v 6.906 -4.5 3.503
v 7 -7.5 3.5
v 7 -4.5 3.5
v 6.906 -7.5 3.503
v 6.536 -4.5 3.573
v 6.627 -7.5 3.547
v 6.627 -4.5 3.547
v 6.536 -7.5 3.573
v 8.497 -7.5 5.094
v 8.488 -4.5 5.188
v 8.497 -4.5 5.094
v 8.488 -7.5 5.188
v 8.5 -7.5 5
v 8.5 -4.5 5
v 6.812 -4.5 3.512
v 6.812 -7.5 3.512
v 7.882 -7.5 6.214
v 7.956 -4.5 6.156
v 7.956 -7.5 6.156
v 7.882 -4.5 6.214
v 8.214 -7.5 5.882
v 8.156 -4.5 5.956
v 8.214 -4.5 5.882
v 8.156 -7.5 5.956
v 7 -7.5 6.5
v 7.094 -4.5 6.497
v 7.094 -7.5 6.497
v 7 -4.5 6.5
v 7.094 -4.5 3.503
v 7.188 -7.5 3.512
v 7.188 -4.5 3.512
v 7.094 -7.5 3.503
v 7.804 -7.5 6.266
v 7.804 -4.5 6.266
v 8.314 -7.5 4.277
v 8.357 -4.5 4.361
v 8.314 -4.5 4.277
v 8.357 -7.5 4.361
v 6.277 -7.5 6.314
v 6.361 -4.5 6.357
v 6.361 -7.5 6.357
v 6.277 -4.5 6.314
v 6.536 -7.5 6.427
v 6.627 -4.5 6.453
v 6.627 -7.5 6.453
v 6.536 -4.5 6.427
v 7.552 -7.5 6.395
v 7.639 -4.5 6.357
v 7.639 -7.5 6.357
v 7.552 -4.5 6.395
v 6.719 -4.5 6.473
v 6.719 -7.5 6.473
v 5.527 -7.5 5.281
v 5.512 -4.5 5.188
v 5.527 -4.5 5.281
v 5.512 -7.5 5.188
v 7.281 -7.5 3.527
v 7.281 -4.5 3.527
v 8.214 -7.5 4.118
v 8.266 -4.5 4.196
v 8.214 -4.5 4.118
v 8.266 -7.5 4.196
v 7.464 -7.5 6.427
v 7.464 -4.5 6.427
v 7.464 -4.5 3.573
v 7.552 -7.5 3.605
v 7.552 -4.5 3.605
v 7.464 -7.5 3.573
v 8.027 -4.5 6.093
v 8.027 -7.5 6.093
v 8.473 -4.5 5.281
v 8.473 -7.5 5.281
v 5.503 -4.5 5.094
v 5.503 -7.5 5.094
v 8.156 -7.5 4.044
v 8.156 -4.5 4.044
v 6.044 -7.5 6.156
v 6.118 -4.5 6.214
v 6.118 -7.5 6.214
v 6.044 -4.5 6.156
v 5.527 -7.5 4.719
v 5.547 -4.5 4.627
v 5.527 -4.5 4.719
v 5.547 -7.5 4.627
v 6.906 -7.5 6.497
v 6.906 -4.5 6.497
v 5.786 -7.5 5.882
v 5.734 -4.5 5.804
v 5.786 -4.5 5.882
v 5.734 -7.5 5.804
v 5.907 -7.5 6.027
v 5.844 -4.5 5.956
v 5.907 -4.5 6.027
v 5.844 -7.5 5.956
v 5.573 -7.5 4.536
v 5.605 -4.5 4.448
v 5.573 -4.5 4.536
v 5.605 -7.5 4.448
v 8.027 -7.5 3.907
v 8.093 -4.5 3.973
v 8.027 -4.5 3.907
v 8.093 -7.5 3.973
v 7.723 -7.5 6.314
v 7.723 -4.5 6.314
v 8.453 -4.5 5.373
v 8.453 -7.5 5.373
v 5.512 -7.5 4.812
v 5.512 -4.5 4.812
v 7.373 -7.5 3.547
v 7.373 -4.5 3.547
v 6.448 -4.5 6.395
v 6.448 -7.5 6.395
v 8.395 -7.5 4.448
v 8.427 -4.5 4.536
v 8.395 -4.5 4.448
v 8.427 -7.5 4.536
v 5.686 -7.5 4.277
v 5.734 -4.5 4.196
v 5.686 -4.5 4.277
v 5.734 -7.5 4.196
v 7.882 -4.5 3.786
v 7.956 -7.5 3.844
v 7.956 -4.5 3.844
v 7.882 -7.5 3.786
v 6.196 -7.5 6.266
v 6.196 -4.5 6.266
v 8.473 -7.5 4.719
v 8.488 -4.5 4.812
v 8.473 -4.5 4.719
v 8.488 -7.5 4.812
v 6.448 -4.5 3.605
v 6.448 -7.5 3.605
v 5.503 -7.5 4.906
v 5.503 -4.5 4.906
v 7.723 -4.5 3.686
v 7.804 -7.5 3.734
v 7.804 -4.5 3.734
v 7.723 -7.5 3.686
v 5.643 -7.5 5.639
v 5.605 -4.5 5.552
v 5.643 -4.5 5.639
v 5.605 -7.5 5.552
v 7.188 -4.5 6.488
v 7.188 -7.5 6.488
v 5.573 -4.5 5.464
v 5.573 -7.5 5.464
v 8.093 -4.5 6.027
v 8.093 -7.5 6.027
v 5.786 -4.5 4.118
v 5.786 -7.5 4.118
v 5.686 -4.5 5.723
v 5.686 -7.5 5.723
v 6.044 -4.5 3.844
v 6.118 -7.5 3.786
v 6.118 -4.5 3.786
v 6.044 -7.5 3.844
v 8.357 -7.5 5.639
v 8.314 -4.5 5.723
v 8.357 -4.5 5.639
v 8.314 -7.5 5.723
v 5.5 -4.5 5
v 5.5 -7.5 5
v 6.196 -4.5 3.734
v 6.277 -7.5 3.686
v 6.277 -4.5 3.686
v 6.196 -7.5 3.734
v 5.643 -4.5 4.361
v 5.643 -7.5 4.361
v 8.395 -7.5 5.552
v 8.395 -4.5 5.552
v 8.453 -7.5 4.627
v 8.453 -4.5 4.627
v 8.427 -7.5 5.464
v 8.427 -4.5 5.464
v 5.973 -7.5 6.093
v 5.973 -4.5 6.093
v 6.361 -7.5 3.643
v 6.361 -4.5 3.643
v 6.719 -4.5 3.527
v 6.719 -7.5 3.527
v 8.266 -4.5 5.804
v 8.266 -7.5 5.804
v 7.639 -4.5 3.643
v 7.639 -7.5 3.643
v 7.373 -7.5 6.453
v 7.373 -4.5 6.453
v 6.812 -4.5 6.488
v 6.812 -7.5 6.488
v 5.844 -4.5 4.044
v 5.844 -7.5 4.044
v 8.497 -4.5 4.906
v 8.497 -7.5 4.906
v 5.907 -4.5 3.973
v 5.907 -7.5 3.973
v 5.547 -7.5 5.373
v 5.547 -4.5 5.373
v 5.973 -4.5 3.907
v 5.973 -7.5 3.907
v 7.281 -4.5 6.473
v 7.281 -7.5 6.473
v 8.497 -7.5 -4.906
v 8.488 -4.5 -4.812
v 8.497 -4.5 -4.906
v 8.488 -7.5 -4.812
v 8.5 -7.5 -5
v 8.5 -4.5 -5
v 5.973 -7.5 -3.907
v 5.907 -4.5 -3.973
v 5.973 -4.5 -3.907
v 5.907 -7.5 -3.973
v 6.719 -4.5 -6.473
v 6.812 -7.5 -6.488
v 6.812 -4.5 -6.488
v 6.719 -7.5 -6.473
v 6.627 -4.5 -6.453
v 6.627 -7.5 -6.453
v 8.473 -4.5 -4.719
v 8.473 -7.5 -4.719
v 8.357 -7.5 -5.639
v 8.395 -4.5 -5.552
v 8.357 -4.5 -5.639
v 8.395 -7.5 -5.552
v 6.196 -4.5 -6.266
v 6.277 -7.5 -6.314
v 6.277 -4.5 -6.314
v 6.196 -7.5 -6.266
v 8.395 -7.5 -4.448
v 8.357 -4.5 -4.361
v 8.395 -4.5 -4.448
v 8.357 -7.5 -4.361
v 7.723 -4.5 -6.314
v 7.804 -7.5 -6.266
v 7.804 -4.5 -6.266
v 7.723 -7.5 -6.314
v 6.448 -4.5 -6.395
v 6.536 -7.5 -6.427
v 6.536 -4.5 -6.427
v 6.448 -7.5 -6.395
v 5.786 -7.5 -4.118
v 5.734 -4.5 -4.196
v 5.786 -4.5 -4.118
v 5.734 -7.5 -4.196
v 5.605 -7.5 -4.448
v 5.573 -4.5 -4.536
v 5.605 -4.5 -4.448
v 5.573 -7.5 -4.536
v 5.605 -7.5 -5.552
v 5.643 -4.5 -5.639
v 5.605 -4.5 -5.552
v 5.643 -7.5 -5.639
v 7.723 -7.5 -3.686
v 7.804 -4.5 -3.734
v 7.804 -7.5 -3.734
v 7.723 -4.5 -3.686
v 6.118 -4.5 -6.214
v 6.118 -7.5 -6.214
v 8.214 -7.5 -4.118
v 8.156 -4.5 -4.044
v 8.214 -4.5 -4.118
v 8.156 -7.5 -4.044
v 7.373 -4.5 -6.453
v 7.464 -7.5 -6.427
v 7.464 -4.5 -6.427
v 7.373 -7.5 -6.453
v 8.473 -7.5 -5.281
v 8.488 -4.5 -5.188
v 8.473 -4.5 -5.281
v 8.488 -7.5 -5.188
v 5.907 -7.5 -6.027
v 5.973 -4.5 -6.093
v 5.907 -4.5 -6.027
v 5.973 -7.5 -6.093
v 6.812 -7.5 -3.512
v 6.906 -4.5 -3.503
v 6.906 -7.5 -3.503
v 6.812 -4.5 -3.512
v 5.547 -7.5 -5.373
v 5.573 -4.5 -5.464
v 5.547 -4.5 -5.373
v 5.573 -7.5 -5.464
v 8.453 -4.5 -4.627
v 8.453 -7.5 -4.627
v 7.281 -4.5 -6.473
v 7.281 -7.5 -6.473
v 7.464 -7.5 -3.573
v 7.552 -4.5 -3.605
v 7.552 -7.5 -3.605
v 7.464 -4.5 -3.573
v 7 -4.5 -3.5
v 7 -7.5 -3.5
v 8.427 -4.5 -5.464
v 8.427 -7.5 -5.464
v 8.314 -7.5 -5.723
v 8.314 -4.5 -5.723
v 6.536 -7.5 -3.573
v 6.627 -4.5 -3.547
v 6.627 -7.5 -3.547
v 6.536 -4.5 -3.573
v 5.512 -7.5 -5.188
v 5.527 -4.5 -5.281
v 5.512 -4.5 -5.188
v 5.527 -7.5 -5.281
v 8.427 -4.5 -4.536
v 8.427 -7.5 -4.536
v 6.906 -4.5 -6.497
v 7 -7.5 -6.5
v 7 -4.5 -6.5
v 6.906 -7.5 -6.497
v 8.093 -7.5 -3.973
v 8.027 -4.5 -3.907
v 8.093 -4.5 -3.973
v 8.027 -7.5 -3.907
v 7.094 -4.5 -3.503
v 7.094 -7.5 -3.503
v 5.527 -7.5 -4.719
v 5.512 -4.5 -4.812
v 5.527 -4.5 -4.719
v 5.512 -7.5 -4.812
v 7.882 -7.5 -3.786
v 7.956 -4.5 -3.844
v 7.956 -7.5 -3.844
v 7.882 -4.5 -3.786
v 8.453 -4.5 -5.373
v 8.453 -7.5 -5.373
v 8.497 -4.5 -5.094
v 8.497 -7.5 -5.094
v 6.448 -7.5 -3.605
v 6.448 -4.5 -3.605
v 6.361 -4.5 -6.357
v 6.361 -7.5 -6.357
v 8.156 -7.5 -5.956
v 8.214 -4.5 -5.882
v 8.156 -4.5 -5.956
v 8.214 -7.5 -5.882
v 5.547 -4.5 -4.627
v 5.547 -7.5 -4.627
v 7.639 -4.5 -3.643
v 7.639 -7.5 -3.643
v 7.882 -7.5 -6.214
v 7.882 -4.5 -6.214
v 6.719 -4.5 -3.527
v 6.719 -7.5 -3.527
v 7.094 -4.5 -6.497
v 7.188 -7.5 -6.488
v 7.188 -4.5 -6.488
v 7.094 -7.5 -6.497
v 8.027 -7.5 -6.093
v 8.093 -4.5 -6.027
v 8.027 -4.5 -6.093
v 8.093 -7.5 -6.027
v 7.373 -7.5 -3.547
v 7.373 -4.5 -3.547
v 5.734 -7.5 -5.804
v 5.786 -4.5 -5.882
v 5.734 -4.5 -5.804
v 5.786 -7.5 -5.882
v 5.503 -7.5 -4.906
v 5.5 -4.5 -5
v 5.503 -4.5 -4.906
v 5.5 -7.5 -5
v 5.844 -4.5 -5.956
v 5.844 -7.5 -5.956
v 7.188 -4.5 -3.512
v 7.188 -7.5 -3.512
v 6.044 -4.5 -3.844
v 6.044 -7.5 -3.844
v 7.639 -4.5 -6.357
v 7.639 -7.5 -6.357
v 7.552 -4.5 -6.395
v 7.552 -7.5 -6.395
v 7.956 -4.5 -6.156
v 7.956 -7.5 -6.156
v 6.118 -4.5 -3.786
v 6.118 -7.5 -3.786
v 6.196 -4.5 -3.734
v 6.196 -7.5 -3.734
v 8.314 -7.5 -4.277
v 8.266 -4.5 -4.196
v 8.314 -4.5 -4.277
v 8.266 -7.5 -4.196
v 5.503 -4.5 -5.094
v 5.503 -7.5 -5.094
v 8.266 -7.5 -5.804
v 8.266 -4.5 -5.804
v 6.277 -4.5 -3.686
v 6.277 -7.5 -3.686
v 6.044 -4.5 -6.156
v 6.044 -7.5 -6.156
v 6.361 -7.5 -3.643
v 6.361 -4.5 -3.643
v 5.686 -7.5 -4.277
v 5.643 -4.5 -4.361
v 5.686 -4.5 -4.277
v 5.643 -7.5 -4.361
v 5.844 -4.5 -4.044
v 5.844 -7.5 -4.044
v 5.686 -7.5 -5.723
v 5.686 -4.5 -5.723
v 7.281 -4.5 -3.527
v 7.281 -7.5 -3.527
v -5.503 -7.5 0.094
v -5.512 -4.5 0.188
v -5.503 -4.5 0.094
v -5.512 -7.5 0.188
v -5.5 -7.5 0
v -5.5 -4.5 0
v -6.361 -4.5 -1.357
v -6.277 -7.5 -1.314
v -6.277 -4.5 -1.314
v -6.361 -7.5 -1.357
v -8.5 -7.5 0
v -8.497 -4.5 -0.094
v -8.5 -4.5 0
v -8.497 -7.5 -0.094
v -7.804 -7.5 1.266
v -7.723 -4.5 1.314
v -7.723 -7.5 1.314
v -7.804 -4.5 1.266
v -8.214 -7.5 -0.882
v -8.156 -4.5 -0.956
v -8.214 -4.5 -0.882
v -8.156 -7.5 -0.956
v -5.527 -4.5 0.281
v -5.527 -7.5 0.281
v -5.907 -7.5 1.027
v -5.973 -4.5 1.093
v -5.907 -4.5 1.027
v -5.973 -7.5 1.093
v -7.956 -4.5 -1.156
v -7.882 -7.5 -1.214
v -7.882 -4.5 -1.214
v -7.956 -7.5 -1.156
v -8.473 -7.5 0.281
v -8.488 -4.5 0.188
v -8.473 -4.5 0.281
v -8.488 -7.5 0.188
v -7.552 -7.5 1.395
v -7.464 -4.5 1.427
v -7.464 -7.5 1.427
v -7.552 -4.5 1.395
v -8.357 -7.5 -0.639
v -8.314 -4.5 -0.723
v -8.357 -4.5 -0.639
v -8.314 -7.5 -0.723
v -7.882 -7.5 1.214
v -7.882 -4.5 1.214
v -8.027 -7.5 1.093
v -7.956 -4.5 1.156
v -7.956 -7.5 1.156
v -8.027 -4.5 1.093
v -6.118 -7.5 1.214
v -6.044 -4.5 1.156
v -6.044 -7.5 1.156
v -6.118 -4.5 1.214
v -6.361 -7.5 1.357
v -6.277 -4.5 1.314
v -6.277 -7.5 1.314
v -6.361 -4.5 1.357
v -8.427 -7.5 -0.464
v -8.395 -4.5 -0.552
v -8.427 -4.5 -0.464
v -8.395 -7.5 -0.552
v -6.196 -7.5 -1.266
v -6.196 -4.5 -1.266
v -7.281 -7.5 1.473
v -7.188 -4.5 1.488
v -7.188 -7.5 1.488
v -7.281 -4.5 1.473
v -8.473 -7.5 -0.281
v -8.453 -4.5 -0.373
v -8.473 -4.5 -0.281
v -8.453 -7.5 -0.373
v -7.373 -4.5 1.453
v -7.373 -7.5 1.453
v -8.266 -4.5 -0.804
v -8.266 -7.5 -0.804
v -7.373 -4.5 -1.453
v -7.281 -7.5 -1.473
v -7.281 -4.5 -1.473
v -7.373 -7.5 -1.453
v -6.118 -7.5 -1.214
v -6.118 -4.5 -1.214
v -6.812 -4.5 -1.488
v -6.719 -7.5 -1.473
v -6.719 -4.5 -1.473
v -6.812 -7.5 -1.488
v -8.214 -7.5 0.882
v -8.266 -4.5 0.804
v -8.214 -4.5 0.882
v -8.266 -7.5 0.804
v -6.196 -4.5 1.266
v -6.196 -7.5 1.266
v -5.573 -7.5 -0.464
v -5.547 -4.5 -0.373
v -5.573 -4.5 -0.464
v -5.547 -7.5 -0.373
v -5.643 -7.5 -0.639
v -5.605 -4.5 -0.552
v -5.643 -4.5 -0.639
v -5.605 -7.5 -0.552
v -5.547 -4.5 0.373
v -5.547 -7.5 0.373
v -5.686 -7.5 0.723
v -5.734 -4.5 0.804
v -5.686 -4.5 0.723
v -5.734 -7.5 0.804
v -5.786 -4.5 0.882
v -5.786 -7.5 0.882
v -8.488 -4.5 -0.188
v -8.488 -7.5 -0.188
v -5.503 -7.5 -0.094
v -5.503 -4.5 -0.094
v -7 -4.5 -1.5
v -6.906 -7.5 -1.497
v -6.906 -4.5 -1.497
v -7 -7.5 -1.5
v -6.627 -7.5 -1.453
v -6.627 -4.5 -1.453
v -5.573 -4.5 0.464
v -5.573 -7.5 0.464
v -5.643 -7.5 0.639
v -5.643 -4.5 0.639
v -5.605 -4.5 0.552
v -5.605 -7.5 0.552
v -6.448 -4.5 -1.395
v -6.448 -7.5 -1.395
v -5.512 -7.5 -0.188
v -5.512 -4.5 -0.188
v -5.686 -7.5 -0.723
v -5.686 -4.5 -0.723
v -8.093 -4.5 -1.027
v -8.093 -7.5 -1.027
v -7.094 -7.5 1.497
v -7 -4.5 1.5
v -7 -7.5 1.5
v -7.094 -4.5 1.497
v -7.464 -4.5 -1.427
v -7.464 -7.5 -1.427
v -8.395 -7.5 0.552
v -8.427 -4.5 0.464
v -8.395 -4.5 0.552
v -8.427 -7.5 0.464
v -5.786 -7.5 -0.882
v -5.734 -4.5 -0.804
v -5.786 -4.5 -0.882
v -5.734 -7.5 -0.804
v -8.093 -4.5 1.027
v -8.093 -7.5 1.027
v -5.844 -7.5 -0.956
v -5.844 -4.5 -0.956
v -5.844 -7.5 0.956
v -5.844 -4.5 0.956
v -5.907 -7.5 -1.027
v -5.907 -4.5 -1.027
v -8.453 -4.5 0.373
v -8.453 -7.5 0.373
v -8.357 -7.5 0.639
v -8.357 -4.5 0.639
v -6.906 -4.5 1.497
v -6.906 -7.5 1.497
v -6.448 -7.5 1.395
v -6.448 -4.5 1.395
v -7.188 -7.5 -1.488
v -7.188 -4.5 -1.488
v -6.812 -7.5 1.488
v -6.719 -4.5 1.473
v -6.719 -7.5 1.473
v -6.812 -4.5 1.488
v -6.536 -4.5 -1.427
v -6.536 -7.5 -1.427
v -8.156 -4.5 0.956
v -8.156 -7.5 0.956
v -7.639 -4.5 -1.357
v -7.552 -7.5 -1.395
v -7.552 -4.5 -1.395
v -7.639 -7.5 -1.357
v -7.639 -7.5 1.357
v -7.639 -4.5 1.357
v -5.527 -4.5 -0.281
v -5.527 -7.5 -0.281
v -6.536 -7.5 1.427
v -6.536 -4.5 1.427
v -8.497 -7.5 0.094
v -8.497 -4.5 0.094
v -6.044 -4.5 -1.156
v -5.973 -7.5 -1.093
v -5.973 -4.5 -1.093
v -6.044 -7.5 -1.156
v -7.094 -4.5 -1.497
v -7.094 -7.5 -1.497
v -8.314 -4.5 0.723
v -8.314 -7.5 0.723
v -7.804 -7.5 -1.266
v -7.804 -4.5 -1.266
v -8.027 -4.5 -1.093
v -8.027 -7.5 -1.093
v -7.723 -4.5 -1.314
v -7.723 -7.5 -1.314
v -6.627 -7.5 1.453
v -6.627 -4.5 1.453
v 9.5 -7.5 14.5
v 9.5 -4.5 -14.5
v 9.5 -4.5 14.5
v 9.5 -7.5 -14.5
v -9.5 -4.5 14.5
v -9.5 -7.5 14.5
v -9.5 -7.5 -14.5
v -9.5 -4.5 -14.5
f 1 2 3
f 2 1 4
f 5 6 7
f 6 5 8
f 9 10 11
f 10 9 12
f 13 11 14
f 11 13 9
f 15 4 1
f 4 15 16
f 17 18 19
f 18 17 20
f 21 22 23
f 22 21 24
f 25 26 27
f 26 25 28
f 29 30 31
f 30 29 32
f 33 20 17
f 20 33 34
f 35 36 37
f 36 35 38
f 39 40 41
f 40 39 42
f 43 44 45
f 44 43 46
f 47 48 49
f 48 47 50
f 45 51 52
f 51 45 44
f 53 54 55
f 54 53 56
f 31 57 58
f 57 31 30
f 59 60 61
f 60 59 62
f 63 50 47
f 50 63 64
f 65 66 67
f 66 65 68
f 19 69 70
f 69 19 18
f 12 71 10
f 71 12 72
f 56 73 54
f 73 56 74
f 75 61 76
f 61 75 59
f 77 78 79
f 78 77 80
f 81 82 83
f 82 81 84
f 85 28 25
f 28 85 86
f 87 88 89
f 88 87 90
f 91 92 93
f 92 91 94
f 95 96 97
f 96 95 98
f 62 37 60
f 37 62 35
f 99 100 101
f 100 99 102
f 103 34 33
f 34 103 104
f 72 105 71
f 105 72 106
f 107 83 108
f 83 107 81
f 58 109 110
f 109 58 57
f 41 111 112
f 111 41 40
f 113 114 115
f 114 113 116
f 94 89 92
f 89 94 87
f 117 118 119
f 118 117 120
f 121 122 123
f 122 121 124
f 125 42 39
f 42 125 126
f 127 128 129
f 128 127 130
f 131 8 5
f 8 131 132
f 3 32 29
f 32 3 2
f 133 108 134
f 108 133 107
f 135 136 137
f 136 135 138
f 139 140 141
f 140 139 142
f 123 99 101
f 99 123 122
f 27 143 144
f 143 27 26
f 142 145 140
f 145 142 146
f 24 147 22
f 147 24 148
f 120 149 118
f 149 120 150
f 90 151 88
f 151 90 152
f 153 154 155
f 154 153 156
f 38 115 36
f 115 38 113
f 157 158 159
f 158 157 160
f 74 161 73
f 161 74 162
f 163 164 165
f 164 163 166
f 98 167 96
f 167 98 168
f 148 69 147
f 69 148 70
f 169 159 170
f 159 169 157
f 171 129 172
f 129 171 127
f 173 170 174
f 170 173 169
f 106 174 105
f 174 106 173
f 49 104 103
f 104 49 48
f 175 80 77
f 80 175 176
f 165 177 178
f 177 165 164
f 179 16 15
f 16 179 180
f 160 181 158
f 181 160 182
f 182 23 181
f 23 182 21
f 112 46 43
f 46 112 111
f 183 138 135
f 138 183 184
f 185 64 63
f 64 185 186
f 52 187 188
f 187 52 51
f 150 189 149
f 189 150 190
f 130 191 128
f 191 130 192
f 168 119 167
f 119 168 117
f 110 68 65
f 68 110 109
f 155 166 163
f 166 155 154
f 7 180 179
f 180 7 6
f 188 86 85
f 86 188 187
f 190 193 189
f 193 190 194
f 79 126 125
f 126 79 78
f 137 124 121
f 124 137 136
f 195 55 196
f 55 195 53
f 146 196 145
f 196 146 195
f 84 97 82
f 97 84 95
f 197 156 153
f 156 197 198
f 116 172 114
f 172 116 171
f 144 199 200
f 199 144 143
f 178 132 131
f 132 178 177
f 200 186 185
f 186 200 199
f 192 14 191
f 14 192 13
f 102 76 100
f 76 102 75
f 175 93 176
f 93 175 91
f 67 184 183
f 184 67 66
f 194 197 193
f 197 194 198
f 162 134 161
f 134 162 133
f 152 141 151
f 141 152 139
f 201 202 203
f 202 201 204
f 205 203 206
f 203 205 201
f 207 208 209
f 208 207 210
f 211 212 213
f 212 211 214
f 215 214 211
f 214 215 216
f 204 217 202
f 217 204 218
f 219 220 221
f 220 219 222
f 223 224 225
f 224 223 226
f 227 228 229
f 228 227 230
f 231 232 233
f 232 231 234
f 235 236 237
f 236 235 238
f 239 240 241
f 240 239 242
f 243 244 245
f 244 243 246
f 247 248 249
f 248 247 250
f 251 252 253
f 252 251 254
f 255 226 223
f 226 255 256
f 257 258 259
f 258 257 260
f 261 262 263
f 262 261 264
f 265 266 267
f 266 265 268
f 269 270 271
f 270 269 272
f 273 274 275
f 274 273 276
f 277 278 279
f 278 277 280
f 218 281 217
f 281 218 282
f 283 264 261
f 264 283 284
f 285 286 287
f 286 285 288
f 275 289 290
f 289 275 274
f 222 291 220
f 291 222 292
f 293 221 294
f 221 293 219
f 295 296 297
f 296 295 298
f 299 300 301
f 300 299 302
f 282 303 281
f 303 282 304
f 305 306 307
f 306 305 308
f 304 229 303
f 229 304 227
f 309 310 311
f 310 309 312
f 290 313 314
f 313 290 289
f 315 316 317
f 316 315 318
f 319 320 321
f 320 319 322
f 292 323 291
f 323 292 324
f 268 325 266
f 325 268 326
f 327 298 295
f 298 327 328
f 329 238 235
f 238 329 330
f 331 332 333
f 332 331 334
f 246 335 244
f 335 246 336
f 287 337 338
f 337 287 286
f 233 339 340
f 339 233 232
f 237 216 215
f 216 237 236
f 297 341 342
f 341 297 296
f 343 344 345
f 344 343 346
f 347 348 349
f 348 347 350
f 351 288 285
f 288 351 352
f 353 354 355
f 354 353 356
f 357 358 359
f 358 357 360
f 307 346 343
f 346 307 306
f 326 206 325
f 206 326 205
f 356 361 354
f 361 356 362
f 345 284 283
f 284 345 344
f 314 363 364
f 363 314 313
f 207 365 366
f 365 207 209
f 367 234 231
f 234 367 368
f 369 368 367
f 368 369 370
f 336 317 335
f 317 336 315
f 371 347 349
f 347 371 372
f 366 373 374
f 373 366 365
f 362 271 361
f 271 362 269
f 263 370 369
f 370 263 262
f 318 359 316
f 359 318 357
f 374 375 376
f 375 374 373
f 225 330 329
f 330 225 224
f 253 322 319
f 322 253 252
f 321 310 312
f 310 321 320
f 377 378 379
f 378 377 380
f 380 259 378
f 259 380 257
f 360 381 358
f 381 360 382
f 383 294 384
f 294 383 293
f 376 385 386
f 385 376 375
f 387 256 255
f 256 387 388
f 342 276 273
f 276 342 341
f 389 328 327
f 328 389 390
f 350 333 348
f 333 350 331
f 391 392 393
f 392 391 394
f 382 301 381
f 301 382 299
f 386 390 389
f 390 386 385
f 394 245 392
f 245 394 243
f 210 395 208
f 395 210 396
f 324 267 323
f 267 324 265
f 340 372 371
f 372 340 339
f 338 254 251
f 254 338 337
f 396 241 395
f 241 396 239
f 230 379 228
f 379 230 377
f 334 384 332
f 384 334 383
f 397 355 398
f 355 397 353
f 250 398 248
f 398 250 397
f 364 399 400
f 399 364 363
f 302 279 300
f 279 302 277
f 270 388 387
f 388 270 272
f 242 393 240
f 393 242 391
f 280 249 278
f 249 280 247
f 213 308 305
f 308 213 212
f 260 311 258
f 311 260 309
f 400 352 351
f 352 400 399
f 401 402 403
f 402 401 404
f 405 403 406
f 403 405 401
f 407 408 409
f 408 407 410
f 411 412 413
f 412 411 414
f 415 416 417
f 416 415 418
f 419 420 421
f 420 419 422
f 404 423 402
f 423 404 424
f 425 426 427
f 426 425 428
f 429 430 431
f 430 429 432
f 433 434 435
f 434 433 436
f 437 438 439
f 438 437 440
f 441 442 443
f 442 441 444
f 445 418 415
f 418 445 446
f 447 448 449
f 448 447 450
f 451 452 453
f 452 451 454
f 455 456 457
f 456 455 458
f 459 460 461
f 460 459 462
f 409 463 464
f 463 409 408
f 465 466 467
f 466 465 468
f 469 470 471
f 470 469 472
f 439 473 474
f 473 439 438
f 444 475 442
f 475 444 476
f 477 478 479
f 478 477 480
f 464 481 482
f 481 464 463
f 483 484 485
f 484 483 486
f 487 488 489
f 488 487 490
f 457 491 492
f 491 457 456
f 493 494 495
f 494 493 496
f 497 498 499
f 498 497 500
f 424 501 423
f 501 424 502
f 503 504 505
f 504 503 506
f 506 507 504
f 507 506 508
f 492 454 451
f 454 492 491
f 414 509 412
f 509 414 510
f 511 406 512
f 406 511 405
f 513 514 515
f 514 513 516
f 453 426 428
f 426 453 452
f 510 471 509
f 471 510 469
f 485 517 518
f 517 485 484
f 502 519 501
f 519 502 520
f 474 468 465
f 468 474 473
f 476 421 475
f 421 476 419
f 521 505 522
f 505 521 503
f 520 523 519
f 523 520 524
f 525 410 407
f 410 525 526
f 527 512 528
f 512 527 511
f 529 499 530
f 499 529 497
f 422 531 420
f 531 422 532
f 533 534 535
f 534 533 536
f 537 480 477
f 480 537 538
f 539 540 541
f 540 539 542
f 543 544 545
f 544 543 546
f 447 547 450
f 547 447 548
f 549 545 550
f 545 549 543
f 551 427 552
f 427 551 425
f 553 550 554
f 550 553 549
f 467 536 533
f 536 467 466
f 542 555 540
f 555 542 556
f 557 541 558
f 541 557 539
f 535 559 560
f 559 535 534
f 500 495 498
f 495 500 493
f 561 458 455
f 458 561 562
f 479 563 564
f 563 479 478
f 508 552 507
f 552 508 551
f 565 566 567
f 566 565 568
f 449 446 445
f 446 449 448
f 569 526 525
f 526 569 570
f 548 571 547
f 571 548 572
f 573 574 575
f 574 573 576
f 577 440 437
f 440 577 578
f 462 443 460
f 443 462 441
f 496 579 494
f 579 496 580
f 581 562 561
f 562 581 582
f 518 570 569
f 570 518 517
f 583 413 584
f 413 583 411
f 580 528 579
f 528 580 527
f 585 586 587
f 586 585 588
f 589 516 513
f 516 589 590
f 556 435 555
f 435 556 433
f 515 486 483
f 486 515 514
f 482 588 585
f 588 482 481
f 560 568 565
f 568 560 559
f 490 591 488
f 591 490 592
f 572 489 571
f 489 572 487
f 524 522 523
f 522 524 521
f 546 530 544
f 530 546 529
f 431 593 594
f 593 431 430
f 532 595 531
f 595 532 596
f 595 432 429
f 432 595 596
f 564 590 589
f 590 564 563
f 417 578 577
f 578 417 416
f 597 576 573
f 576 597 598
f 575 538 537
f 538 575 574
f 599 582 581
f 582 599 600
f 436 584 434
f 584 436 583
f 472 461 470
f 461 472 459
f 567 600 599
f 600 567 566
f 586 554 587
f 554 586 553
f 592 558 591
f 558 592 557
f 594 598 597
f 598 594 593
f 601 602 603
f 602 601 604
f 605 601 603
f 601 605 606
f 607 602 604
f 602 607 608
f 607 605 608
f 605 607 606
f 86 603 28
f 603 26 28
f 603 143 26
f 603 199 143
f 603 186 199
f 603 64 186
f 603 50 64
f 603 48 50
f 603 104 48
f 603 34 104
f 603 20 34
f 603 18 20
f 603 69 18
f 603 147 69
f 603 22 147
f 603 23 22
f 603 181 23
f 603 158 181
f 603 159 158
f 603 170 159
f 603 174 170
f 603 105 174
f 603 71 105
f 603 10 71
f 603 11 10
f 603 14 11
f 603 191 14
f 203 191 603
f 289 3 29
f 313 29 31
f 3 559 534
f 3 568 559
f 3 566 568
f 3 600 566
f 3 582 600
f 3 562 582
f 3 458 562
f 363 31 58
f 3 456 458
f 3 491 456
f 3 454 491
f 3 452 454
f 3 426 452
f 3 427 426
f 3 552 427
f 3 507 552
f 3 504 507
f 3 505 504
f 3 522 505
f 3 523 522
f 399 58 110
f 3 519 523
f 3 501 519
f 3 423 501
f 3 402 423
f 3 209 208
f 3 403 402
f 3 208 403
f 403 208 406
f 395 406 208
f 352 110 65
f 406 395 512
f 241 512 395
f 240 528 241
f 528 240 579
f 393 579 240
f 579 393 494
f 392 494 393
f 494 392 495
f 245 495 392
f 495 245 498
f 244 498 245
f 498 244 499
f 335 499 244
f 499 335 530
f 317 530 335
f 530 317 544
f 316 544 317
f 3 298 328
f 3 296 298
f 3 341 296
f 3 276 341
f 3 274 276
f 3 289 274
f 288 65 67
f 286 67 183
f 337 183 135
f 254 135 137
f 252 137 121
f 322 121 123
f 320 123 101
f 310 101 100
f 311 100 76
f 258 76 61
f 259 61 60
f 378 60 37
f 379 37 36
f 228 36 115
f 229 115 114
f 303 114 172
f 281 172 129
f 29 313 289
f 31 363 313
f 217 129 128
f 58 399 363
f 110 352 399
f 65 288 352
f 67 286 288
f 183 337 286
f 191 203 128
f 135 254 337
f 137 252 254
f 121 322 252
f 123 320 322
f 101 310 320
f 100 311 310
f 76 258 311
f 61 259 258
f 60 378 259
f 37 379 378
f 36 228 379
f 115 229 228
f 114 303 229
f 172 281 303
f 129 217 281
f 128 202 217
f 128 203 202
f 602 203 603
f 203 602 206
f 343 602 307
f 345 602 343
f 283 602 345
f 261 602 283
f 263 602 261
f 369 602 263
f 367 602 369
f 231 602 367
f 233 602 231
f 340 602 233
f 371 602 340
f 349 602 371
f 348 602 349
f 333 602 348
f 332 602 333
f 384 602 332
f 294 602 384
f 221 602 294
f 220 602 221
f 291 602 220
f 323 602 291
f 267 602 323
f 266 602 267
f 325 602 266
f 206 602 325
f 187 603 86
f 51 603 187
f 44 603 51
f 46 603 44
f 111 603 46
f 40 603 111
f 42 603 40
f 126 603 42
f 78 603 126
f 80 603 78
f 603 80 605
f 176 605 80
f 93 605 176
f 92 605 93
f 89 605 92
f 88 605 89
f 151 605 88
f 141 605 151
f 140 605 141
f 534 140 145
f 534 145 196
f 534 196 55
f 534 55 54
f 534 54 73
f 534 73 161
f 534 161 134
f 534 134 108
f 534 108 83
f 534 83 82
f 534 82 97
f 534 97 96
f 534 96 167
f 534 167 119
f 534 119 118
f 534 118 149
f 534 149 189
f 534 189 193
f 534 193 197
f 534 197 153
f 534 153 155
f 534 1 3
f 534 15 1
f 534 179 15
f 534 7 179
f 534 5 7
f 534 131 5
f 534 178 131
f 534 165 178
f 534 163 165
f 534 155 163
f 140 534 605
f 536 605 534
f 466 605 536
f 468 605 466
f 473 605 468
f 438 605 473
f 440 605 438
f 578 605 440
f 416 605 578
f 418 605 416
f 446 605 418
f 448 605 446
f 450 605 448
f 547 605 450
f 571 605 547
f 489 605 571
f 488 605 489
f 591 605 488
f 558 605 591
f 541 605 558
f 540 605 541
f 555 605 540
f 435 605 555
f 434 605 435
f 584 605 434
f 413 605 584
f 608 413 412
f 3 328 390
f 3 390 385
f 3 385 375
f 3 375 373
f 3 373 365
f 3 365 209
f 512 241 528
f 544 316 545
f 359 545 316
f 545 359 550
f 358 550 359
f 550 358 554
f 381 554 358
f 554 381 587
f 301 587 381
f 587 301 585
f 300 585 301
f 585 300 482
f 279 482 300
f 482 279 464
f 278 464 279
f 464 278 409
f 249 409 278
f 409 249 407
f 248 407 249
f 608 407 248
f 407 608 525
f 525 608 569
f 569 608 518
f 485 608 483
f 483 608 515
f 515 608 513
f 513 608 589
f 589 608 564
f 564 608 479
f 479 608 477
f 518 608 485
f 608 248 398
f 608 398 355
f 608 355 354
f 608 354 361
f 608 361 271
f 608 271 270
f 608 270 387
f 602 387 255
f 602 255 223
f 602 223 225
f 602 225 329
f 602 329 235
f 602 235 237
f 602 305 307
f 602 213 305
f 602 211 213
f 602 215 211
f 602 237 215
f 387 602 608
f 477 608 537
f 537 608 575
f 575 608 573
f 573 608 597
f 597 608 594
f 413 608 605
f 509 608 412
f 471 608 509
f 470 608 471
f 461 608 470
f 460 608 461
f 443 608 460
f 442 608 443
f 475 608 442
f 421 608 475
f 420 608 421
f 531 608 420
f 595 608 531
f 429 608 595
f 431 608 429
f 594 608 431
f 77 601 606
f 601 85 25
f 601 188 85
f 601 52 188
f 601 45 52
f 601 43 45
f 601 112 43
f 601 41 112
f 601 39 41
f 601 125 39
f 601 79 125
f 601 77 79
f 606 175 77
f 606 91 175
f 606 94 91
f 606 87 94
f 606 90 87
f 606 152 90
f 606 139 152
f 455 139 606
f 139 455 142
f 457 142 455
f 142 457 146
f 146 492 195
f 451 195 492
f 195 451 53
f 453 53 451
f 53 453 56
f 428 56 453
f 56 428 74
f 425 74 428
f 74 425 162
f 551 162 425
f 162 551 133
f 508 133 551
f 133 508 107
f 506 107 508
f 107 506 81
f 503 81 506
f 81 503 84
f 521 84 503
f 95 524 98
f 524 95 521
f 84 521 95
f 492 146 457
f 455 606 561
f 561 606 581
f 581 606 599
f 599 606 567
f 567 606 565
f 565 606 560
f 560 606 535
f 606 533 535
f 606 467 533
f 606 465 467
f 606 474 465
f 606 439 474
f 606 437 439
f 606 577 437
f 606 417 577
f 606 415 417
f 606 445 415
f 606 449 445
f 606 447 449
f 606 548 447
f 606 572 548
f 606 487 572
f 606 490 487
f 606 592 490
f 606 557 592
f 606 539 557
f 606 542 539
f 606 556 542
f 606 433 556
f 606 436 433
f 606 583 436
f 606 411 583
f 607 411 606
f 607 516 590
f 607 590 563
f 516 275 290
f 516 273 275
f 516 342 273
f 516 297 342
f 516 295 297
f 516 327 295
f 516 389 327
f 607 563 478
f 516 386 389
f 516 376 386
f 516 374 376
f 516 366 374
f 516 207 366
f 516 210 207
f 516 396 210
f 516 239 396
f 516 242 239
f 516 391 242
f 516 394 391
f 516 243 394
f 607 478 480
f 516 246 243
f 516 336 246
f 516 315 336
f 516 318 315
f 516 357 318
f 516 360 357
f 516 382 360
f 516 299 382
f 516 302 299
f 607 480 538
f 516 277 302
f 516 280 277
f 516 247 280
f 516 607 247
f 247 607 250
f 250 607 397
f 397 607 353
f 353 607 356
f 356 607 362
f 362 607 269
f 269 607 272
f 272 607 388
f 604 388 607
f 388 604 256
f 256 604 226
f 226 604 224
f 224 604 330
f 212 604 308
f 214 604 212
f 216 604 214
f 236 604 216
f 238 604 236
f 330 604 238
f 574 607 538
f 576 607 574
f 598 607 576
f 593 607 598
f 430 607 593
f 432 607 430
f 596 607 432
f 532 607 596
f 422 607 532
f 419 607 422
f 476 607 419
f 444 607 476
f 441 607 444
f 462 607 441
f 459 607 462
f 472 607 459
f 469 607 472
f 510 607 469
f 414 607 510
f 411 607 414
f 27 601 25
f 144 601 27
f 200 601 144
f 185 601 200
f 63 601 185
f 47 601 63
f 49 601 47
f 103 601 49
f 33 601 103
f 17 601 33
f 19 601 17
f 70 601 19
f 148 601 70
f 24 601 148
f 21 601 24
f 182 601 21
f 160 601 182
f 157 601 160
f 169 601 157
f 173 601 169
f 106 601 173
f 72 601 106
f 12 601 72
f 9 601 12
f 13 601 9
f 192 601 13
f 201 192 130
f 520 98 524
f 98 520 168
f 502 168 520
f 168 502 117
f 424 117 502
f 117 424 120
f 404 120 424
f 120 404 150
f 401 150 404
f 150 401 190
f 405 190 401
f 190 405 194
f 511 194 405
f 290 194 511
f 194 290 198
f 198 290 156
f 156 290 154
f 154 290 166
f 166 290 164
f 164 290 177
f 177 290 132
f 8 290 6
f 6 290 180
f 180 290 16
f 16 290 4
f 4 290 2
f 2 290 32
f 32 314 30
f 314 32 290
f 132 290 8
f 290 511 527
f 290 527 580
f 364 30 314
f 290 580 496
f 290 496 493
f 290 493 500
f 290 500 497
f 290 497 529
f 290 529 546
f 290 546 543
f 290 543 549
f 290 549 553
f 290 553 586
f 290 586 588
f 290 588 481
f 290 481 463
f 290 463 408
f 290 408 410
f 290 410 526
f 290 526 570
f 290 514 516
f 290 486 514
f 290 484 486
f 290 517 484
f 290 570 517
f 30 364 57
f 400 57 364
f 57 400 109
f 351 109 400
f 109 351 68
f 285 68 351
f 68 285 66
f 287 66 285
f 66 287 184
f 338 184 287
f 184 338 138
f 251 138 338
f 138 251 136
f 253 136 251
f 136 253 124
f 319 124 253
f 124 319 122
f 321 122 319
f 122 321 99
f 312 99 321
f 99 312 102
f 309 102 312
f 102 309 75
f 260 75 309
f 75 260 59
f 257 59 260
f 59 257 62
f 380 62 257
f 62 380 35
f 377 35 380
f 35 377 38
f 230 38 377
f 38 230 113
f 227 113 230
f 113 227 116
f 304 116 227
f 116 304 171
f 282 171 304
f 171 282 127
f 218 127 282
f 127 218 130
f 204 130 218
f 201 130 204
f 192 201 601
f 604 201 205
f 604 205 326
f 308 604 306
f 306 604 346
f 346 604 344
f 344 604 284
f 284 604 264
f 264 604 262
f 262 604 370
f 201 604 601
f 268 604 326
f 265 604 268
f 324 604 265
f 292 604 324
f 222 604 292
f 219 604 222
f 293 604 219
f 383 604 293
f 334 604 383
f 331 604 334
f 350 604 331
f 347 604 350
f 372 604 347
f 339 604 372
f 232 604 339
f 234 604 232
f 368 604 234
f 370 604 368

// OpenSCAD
difference(){
	union(){

        translate([-9.5,-7.5,-14.5]){
            cube([19,3,29], center=false);
        }

        
        

	}
	union() {

        translate([7,20,5]){
            rotate([90,0,0]){
                color("blue")
                cylinder(h=100, r=1.5, $fn=100, center=false);
            }
        }
        translate([7,20,-5]){
            rotate([90,0,0]){
                color("blue")
                cylinder(h=100, r=1.5, $fn=100, center=false);
            }
        }
        translate([-7,20,0]){
            rotate([90,0,0]){
                cylinder(h=100, r=1.5, $fn=100, center=false);
            }
        }

	}
}
